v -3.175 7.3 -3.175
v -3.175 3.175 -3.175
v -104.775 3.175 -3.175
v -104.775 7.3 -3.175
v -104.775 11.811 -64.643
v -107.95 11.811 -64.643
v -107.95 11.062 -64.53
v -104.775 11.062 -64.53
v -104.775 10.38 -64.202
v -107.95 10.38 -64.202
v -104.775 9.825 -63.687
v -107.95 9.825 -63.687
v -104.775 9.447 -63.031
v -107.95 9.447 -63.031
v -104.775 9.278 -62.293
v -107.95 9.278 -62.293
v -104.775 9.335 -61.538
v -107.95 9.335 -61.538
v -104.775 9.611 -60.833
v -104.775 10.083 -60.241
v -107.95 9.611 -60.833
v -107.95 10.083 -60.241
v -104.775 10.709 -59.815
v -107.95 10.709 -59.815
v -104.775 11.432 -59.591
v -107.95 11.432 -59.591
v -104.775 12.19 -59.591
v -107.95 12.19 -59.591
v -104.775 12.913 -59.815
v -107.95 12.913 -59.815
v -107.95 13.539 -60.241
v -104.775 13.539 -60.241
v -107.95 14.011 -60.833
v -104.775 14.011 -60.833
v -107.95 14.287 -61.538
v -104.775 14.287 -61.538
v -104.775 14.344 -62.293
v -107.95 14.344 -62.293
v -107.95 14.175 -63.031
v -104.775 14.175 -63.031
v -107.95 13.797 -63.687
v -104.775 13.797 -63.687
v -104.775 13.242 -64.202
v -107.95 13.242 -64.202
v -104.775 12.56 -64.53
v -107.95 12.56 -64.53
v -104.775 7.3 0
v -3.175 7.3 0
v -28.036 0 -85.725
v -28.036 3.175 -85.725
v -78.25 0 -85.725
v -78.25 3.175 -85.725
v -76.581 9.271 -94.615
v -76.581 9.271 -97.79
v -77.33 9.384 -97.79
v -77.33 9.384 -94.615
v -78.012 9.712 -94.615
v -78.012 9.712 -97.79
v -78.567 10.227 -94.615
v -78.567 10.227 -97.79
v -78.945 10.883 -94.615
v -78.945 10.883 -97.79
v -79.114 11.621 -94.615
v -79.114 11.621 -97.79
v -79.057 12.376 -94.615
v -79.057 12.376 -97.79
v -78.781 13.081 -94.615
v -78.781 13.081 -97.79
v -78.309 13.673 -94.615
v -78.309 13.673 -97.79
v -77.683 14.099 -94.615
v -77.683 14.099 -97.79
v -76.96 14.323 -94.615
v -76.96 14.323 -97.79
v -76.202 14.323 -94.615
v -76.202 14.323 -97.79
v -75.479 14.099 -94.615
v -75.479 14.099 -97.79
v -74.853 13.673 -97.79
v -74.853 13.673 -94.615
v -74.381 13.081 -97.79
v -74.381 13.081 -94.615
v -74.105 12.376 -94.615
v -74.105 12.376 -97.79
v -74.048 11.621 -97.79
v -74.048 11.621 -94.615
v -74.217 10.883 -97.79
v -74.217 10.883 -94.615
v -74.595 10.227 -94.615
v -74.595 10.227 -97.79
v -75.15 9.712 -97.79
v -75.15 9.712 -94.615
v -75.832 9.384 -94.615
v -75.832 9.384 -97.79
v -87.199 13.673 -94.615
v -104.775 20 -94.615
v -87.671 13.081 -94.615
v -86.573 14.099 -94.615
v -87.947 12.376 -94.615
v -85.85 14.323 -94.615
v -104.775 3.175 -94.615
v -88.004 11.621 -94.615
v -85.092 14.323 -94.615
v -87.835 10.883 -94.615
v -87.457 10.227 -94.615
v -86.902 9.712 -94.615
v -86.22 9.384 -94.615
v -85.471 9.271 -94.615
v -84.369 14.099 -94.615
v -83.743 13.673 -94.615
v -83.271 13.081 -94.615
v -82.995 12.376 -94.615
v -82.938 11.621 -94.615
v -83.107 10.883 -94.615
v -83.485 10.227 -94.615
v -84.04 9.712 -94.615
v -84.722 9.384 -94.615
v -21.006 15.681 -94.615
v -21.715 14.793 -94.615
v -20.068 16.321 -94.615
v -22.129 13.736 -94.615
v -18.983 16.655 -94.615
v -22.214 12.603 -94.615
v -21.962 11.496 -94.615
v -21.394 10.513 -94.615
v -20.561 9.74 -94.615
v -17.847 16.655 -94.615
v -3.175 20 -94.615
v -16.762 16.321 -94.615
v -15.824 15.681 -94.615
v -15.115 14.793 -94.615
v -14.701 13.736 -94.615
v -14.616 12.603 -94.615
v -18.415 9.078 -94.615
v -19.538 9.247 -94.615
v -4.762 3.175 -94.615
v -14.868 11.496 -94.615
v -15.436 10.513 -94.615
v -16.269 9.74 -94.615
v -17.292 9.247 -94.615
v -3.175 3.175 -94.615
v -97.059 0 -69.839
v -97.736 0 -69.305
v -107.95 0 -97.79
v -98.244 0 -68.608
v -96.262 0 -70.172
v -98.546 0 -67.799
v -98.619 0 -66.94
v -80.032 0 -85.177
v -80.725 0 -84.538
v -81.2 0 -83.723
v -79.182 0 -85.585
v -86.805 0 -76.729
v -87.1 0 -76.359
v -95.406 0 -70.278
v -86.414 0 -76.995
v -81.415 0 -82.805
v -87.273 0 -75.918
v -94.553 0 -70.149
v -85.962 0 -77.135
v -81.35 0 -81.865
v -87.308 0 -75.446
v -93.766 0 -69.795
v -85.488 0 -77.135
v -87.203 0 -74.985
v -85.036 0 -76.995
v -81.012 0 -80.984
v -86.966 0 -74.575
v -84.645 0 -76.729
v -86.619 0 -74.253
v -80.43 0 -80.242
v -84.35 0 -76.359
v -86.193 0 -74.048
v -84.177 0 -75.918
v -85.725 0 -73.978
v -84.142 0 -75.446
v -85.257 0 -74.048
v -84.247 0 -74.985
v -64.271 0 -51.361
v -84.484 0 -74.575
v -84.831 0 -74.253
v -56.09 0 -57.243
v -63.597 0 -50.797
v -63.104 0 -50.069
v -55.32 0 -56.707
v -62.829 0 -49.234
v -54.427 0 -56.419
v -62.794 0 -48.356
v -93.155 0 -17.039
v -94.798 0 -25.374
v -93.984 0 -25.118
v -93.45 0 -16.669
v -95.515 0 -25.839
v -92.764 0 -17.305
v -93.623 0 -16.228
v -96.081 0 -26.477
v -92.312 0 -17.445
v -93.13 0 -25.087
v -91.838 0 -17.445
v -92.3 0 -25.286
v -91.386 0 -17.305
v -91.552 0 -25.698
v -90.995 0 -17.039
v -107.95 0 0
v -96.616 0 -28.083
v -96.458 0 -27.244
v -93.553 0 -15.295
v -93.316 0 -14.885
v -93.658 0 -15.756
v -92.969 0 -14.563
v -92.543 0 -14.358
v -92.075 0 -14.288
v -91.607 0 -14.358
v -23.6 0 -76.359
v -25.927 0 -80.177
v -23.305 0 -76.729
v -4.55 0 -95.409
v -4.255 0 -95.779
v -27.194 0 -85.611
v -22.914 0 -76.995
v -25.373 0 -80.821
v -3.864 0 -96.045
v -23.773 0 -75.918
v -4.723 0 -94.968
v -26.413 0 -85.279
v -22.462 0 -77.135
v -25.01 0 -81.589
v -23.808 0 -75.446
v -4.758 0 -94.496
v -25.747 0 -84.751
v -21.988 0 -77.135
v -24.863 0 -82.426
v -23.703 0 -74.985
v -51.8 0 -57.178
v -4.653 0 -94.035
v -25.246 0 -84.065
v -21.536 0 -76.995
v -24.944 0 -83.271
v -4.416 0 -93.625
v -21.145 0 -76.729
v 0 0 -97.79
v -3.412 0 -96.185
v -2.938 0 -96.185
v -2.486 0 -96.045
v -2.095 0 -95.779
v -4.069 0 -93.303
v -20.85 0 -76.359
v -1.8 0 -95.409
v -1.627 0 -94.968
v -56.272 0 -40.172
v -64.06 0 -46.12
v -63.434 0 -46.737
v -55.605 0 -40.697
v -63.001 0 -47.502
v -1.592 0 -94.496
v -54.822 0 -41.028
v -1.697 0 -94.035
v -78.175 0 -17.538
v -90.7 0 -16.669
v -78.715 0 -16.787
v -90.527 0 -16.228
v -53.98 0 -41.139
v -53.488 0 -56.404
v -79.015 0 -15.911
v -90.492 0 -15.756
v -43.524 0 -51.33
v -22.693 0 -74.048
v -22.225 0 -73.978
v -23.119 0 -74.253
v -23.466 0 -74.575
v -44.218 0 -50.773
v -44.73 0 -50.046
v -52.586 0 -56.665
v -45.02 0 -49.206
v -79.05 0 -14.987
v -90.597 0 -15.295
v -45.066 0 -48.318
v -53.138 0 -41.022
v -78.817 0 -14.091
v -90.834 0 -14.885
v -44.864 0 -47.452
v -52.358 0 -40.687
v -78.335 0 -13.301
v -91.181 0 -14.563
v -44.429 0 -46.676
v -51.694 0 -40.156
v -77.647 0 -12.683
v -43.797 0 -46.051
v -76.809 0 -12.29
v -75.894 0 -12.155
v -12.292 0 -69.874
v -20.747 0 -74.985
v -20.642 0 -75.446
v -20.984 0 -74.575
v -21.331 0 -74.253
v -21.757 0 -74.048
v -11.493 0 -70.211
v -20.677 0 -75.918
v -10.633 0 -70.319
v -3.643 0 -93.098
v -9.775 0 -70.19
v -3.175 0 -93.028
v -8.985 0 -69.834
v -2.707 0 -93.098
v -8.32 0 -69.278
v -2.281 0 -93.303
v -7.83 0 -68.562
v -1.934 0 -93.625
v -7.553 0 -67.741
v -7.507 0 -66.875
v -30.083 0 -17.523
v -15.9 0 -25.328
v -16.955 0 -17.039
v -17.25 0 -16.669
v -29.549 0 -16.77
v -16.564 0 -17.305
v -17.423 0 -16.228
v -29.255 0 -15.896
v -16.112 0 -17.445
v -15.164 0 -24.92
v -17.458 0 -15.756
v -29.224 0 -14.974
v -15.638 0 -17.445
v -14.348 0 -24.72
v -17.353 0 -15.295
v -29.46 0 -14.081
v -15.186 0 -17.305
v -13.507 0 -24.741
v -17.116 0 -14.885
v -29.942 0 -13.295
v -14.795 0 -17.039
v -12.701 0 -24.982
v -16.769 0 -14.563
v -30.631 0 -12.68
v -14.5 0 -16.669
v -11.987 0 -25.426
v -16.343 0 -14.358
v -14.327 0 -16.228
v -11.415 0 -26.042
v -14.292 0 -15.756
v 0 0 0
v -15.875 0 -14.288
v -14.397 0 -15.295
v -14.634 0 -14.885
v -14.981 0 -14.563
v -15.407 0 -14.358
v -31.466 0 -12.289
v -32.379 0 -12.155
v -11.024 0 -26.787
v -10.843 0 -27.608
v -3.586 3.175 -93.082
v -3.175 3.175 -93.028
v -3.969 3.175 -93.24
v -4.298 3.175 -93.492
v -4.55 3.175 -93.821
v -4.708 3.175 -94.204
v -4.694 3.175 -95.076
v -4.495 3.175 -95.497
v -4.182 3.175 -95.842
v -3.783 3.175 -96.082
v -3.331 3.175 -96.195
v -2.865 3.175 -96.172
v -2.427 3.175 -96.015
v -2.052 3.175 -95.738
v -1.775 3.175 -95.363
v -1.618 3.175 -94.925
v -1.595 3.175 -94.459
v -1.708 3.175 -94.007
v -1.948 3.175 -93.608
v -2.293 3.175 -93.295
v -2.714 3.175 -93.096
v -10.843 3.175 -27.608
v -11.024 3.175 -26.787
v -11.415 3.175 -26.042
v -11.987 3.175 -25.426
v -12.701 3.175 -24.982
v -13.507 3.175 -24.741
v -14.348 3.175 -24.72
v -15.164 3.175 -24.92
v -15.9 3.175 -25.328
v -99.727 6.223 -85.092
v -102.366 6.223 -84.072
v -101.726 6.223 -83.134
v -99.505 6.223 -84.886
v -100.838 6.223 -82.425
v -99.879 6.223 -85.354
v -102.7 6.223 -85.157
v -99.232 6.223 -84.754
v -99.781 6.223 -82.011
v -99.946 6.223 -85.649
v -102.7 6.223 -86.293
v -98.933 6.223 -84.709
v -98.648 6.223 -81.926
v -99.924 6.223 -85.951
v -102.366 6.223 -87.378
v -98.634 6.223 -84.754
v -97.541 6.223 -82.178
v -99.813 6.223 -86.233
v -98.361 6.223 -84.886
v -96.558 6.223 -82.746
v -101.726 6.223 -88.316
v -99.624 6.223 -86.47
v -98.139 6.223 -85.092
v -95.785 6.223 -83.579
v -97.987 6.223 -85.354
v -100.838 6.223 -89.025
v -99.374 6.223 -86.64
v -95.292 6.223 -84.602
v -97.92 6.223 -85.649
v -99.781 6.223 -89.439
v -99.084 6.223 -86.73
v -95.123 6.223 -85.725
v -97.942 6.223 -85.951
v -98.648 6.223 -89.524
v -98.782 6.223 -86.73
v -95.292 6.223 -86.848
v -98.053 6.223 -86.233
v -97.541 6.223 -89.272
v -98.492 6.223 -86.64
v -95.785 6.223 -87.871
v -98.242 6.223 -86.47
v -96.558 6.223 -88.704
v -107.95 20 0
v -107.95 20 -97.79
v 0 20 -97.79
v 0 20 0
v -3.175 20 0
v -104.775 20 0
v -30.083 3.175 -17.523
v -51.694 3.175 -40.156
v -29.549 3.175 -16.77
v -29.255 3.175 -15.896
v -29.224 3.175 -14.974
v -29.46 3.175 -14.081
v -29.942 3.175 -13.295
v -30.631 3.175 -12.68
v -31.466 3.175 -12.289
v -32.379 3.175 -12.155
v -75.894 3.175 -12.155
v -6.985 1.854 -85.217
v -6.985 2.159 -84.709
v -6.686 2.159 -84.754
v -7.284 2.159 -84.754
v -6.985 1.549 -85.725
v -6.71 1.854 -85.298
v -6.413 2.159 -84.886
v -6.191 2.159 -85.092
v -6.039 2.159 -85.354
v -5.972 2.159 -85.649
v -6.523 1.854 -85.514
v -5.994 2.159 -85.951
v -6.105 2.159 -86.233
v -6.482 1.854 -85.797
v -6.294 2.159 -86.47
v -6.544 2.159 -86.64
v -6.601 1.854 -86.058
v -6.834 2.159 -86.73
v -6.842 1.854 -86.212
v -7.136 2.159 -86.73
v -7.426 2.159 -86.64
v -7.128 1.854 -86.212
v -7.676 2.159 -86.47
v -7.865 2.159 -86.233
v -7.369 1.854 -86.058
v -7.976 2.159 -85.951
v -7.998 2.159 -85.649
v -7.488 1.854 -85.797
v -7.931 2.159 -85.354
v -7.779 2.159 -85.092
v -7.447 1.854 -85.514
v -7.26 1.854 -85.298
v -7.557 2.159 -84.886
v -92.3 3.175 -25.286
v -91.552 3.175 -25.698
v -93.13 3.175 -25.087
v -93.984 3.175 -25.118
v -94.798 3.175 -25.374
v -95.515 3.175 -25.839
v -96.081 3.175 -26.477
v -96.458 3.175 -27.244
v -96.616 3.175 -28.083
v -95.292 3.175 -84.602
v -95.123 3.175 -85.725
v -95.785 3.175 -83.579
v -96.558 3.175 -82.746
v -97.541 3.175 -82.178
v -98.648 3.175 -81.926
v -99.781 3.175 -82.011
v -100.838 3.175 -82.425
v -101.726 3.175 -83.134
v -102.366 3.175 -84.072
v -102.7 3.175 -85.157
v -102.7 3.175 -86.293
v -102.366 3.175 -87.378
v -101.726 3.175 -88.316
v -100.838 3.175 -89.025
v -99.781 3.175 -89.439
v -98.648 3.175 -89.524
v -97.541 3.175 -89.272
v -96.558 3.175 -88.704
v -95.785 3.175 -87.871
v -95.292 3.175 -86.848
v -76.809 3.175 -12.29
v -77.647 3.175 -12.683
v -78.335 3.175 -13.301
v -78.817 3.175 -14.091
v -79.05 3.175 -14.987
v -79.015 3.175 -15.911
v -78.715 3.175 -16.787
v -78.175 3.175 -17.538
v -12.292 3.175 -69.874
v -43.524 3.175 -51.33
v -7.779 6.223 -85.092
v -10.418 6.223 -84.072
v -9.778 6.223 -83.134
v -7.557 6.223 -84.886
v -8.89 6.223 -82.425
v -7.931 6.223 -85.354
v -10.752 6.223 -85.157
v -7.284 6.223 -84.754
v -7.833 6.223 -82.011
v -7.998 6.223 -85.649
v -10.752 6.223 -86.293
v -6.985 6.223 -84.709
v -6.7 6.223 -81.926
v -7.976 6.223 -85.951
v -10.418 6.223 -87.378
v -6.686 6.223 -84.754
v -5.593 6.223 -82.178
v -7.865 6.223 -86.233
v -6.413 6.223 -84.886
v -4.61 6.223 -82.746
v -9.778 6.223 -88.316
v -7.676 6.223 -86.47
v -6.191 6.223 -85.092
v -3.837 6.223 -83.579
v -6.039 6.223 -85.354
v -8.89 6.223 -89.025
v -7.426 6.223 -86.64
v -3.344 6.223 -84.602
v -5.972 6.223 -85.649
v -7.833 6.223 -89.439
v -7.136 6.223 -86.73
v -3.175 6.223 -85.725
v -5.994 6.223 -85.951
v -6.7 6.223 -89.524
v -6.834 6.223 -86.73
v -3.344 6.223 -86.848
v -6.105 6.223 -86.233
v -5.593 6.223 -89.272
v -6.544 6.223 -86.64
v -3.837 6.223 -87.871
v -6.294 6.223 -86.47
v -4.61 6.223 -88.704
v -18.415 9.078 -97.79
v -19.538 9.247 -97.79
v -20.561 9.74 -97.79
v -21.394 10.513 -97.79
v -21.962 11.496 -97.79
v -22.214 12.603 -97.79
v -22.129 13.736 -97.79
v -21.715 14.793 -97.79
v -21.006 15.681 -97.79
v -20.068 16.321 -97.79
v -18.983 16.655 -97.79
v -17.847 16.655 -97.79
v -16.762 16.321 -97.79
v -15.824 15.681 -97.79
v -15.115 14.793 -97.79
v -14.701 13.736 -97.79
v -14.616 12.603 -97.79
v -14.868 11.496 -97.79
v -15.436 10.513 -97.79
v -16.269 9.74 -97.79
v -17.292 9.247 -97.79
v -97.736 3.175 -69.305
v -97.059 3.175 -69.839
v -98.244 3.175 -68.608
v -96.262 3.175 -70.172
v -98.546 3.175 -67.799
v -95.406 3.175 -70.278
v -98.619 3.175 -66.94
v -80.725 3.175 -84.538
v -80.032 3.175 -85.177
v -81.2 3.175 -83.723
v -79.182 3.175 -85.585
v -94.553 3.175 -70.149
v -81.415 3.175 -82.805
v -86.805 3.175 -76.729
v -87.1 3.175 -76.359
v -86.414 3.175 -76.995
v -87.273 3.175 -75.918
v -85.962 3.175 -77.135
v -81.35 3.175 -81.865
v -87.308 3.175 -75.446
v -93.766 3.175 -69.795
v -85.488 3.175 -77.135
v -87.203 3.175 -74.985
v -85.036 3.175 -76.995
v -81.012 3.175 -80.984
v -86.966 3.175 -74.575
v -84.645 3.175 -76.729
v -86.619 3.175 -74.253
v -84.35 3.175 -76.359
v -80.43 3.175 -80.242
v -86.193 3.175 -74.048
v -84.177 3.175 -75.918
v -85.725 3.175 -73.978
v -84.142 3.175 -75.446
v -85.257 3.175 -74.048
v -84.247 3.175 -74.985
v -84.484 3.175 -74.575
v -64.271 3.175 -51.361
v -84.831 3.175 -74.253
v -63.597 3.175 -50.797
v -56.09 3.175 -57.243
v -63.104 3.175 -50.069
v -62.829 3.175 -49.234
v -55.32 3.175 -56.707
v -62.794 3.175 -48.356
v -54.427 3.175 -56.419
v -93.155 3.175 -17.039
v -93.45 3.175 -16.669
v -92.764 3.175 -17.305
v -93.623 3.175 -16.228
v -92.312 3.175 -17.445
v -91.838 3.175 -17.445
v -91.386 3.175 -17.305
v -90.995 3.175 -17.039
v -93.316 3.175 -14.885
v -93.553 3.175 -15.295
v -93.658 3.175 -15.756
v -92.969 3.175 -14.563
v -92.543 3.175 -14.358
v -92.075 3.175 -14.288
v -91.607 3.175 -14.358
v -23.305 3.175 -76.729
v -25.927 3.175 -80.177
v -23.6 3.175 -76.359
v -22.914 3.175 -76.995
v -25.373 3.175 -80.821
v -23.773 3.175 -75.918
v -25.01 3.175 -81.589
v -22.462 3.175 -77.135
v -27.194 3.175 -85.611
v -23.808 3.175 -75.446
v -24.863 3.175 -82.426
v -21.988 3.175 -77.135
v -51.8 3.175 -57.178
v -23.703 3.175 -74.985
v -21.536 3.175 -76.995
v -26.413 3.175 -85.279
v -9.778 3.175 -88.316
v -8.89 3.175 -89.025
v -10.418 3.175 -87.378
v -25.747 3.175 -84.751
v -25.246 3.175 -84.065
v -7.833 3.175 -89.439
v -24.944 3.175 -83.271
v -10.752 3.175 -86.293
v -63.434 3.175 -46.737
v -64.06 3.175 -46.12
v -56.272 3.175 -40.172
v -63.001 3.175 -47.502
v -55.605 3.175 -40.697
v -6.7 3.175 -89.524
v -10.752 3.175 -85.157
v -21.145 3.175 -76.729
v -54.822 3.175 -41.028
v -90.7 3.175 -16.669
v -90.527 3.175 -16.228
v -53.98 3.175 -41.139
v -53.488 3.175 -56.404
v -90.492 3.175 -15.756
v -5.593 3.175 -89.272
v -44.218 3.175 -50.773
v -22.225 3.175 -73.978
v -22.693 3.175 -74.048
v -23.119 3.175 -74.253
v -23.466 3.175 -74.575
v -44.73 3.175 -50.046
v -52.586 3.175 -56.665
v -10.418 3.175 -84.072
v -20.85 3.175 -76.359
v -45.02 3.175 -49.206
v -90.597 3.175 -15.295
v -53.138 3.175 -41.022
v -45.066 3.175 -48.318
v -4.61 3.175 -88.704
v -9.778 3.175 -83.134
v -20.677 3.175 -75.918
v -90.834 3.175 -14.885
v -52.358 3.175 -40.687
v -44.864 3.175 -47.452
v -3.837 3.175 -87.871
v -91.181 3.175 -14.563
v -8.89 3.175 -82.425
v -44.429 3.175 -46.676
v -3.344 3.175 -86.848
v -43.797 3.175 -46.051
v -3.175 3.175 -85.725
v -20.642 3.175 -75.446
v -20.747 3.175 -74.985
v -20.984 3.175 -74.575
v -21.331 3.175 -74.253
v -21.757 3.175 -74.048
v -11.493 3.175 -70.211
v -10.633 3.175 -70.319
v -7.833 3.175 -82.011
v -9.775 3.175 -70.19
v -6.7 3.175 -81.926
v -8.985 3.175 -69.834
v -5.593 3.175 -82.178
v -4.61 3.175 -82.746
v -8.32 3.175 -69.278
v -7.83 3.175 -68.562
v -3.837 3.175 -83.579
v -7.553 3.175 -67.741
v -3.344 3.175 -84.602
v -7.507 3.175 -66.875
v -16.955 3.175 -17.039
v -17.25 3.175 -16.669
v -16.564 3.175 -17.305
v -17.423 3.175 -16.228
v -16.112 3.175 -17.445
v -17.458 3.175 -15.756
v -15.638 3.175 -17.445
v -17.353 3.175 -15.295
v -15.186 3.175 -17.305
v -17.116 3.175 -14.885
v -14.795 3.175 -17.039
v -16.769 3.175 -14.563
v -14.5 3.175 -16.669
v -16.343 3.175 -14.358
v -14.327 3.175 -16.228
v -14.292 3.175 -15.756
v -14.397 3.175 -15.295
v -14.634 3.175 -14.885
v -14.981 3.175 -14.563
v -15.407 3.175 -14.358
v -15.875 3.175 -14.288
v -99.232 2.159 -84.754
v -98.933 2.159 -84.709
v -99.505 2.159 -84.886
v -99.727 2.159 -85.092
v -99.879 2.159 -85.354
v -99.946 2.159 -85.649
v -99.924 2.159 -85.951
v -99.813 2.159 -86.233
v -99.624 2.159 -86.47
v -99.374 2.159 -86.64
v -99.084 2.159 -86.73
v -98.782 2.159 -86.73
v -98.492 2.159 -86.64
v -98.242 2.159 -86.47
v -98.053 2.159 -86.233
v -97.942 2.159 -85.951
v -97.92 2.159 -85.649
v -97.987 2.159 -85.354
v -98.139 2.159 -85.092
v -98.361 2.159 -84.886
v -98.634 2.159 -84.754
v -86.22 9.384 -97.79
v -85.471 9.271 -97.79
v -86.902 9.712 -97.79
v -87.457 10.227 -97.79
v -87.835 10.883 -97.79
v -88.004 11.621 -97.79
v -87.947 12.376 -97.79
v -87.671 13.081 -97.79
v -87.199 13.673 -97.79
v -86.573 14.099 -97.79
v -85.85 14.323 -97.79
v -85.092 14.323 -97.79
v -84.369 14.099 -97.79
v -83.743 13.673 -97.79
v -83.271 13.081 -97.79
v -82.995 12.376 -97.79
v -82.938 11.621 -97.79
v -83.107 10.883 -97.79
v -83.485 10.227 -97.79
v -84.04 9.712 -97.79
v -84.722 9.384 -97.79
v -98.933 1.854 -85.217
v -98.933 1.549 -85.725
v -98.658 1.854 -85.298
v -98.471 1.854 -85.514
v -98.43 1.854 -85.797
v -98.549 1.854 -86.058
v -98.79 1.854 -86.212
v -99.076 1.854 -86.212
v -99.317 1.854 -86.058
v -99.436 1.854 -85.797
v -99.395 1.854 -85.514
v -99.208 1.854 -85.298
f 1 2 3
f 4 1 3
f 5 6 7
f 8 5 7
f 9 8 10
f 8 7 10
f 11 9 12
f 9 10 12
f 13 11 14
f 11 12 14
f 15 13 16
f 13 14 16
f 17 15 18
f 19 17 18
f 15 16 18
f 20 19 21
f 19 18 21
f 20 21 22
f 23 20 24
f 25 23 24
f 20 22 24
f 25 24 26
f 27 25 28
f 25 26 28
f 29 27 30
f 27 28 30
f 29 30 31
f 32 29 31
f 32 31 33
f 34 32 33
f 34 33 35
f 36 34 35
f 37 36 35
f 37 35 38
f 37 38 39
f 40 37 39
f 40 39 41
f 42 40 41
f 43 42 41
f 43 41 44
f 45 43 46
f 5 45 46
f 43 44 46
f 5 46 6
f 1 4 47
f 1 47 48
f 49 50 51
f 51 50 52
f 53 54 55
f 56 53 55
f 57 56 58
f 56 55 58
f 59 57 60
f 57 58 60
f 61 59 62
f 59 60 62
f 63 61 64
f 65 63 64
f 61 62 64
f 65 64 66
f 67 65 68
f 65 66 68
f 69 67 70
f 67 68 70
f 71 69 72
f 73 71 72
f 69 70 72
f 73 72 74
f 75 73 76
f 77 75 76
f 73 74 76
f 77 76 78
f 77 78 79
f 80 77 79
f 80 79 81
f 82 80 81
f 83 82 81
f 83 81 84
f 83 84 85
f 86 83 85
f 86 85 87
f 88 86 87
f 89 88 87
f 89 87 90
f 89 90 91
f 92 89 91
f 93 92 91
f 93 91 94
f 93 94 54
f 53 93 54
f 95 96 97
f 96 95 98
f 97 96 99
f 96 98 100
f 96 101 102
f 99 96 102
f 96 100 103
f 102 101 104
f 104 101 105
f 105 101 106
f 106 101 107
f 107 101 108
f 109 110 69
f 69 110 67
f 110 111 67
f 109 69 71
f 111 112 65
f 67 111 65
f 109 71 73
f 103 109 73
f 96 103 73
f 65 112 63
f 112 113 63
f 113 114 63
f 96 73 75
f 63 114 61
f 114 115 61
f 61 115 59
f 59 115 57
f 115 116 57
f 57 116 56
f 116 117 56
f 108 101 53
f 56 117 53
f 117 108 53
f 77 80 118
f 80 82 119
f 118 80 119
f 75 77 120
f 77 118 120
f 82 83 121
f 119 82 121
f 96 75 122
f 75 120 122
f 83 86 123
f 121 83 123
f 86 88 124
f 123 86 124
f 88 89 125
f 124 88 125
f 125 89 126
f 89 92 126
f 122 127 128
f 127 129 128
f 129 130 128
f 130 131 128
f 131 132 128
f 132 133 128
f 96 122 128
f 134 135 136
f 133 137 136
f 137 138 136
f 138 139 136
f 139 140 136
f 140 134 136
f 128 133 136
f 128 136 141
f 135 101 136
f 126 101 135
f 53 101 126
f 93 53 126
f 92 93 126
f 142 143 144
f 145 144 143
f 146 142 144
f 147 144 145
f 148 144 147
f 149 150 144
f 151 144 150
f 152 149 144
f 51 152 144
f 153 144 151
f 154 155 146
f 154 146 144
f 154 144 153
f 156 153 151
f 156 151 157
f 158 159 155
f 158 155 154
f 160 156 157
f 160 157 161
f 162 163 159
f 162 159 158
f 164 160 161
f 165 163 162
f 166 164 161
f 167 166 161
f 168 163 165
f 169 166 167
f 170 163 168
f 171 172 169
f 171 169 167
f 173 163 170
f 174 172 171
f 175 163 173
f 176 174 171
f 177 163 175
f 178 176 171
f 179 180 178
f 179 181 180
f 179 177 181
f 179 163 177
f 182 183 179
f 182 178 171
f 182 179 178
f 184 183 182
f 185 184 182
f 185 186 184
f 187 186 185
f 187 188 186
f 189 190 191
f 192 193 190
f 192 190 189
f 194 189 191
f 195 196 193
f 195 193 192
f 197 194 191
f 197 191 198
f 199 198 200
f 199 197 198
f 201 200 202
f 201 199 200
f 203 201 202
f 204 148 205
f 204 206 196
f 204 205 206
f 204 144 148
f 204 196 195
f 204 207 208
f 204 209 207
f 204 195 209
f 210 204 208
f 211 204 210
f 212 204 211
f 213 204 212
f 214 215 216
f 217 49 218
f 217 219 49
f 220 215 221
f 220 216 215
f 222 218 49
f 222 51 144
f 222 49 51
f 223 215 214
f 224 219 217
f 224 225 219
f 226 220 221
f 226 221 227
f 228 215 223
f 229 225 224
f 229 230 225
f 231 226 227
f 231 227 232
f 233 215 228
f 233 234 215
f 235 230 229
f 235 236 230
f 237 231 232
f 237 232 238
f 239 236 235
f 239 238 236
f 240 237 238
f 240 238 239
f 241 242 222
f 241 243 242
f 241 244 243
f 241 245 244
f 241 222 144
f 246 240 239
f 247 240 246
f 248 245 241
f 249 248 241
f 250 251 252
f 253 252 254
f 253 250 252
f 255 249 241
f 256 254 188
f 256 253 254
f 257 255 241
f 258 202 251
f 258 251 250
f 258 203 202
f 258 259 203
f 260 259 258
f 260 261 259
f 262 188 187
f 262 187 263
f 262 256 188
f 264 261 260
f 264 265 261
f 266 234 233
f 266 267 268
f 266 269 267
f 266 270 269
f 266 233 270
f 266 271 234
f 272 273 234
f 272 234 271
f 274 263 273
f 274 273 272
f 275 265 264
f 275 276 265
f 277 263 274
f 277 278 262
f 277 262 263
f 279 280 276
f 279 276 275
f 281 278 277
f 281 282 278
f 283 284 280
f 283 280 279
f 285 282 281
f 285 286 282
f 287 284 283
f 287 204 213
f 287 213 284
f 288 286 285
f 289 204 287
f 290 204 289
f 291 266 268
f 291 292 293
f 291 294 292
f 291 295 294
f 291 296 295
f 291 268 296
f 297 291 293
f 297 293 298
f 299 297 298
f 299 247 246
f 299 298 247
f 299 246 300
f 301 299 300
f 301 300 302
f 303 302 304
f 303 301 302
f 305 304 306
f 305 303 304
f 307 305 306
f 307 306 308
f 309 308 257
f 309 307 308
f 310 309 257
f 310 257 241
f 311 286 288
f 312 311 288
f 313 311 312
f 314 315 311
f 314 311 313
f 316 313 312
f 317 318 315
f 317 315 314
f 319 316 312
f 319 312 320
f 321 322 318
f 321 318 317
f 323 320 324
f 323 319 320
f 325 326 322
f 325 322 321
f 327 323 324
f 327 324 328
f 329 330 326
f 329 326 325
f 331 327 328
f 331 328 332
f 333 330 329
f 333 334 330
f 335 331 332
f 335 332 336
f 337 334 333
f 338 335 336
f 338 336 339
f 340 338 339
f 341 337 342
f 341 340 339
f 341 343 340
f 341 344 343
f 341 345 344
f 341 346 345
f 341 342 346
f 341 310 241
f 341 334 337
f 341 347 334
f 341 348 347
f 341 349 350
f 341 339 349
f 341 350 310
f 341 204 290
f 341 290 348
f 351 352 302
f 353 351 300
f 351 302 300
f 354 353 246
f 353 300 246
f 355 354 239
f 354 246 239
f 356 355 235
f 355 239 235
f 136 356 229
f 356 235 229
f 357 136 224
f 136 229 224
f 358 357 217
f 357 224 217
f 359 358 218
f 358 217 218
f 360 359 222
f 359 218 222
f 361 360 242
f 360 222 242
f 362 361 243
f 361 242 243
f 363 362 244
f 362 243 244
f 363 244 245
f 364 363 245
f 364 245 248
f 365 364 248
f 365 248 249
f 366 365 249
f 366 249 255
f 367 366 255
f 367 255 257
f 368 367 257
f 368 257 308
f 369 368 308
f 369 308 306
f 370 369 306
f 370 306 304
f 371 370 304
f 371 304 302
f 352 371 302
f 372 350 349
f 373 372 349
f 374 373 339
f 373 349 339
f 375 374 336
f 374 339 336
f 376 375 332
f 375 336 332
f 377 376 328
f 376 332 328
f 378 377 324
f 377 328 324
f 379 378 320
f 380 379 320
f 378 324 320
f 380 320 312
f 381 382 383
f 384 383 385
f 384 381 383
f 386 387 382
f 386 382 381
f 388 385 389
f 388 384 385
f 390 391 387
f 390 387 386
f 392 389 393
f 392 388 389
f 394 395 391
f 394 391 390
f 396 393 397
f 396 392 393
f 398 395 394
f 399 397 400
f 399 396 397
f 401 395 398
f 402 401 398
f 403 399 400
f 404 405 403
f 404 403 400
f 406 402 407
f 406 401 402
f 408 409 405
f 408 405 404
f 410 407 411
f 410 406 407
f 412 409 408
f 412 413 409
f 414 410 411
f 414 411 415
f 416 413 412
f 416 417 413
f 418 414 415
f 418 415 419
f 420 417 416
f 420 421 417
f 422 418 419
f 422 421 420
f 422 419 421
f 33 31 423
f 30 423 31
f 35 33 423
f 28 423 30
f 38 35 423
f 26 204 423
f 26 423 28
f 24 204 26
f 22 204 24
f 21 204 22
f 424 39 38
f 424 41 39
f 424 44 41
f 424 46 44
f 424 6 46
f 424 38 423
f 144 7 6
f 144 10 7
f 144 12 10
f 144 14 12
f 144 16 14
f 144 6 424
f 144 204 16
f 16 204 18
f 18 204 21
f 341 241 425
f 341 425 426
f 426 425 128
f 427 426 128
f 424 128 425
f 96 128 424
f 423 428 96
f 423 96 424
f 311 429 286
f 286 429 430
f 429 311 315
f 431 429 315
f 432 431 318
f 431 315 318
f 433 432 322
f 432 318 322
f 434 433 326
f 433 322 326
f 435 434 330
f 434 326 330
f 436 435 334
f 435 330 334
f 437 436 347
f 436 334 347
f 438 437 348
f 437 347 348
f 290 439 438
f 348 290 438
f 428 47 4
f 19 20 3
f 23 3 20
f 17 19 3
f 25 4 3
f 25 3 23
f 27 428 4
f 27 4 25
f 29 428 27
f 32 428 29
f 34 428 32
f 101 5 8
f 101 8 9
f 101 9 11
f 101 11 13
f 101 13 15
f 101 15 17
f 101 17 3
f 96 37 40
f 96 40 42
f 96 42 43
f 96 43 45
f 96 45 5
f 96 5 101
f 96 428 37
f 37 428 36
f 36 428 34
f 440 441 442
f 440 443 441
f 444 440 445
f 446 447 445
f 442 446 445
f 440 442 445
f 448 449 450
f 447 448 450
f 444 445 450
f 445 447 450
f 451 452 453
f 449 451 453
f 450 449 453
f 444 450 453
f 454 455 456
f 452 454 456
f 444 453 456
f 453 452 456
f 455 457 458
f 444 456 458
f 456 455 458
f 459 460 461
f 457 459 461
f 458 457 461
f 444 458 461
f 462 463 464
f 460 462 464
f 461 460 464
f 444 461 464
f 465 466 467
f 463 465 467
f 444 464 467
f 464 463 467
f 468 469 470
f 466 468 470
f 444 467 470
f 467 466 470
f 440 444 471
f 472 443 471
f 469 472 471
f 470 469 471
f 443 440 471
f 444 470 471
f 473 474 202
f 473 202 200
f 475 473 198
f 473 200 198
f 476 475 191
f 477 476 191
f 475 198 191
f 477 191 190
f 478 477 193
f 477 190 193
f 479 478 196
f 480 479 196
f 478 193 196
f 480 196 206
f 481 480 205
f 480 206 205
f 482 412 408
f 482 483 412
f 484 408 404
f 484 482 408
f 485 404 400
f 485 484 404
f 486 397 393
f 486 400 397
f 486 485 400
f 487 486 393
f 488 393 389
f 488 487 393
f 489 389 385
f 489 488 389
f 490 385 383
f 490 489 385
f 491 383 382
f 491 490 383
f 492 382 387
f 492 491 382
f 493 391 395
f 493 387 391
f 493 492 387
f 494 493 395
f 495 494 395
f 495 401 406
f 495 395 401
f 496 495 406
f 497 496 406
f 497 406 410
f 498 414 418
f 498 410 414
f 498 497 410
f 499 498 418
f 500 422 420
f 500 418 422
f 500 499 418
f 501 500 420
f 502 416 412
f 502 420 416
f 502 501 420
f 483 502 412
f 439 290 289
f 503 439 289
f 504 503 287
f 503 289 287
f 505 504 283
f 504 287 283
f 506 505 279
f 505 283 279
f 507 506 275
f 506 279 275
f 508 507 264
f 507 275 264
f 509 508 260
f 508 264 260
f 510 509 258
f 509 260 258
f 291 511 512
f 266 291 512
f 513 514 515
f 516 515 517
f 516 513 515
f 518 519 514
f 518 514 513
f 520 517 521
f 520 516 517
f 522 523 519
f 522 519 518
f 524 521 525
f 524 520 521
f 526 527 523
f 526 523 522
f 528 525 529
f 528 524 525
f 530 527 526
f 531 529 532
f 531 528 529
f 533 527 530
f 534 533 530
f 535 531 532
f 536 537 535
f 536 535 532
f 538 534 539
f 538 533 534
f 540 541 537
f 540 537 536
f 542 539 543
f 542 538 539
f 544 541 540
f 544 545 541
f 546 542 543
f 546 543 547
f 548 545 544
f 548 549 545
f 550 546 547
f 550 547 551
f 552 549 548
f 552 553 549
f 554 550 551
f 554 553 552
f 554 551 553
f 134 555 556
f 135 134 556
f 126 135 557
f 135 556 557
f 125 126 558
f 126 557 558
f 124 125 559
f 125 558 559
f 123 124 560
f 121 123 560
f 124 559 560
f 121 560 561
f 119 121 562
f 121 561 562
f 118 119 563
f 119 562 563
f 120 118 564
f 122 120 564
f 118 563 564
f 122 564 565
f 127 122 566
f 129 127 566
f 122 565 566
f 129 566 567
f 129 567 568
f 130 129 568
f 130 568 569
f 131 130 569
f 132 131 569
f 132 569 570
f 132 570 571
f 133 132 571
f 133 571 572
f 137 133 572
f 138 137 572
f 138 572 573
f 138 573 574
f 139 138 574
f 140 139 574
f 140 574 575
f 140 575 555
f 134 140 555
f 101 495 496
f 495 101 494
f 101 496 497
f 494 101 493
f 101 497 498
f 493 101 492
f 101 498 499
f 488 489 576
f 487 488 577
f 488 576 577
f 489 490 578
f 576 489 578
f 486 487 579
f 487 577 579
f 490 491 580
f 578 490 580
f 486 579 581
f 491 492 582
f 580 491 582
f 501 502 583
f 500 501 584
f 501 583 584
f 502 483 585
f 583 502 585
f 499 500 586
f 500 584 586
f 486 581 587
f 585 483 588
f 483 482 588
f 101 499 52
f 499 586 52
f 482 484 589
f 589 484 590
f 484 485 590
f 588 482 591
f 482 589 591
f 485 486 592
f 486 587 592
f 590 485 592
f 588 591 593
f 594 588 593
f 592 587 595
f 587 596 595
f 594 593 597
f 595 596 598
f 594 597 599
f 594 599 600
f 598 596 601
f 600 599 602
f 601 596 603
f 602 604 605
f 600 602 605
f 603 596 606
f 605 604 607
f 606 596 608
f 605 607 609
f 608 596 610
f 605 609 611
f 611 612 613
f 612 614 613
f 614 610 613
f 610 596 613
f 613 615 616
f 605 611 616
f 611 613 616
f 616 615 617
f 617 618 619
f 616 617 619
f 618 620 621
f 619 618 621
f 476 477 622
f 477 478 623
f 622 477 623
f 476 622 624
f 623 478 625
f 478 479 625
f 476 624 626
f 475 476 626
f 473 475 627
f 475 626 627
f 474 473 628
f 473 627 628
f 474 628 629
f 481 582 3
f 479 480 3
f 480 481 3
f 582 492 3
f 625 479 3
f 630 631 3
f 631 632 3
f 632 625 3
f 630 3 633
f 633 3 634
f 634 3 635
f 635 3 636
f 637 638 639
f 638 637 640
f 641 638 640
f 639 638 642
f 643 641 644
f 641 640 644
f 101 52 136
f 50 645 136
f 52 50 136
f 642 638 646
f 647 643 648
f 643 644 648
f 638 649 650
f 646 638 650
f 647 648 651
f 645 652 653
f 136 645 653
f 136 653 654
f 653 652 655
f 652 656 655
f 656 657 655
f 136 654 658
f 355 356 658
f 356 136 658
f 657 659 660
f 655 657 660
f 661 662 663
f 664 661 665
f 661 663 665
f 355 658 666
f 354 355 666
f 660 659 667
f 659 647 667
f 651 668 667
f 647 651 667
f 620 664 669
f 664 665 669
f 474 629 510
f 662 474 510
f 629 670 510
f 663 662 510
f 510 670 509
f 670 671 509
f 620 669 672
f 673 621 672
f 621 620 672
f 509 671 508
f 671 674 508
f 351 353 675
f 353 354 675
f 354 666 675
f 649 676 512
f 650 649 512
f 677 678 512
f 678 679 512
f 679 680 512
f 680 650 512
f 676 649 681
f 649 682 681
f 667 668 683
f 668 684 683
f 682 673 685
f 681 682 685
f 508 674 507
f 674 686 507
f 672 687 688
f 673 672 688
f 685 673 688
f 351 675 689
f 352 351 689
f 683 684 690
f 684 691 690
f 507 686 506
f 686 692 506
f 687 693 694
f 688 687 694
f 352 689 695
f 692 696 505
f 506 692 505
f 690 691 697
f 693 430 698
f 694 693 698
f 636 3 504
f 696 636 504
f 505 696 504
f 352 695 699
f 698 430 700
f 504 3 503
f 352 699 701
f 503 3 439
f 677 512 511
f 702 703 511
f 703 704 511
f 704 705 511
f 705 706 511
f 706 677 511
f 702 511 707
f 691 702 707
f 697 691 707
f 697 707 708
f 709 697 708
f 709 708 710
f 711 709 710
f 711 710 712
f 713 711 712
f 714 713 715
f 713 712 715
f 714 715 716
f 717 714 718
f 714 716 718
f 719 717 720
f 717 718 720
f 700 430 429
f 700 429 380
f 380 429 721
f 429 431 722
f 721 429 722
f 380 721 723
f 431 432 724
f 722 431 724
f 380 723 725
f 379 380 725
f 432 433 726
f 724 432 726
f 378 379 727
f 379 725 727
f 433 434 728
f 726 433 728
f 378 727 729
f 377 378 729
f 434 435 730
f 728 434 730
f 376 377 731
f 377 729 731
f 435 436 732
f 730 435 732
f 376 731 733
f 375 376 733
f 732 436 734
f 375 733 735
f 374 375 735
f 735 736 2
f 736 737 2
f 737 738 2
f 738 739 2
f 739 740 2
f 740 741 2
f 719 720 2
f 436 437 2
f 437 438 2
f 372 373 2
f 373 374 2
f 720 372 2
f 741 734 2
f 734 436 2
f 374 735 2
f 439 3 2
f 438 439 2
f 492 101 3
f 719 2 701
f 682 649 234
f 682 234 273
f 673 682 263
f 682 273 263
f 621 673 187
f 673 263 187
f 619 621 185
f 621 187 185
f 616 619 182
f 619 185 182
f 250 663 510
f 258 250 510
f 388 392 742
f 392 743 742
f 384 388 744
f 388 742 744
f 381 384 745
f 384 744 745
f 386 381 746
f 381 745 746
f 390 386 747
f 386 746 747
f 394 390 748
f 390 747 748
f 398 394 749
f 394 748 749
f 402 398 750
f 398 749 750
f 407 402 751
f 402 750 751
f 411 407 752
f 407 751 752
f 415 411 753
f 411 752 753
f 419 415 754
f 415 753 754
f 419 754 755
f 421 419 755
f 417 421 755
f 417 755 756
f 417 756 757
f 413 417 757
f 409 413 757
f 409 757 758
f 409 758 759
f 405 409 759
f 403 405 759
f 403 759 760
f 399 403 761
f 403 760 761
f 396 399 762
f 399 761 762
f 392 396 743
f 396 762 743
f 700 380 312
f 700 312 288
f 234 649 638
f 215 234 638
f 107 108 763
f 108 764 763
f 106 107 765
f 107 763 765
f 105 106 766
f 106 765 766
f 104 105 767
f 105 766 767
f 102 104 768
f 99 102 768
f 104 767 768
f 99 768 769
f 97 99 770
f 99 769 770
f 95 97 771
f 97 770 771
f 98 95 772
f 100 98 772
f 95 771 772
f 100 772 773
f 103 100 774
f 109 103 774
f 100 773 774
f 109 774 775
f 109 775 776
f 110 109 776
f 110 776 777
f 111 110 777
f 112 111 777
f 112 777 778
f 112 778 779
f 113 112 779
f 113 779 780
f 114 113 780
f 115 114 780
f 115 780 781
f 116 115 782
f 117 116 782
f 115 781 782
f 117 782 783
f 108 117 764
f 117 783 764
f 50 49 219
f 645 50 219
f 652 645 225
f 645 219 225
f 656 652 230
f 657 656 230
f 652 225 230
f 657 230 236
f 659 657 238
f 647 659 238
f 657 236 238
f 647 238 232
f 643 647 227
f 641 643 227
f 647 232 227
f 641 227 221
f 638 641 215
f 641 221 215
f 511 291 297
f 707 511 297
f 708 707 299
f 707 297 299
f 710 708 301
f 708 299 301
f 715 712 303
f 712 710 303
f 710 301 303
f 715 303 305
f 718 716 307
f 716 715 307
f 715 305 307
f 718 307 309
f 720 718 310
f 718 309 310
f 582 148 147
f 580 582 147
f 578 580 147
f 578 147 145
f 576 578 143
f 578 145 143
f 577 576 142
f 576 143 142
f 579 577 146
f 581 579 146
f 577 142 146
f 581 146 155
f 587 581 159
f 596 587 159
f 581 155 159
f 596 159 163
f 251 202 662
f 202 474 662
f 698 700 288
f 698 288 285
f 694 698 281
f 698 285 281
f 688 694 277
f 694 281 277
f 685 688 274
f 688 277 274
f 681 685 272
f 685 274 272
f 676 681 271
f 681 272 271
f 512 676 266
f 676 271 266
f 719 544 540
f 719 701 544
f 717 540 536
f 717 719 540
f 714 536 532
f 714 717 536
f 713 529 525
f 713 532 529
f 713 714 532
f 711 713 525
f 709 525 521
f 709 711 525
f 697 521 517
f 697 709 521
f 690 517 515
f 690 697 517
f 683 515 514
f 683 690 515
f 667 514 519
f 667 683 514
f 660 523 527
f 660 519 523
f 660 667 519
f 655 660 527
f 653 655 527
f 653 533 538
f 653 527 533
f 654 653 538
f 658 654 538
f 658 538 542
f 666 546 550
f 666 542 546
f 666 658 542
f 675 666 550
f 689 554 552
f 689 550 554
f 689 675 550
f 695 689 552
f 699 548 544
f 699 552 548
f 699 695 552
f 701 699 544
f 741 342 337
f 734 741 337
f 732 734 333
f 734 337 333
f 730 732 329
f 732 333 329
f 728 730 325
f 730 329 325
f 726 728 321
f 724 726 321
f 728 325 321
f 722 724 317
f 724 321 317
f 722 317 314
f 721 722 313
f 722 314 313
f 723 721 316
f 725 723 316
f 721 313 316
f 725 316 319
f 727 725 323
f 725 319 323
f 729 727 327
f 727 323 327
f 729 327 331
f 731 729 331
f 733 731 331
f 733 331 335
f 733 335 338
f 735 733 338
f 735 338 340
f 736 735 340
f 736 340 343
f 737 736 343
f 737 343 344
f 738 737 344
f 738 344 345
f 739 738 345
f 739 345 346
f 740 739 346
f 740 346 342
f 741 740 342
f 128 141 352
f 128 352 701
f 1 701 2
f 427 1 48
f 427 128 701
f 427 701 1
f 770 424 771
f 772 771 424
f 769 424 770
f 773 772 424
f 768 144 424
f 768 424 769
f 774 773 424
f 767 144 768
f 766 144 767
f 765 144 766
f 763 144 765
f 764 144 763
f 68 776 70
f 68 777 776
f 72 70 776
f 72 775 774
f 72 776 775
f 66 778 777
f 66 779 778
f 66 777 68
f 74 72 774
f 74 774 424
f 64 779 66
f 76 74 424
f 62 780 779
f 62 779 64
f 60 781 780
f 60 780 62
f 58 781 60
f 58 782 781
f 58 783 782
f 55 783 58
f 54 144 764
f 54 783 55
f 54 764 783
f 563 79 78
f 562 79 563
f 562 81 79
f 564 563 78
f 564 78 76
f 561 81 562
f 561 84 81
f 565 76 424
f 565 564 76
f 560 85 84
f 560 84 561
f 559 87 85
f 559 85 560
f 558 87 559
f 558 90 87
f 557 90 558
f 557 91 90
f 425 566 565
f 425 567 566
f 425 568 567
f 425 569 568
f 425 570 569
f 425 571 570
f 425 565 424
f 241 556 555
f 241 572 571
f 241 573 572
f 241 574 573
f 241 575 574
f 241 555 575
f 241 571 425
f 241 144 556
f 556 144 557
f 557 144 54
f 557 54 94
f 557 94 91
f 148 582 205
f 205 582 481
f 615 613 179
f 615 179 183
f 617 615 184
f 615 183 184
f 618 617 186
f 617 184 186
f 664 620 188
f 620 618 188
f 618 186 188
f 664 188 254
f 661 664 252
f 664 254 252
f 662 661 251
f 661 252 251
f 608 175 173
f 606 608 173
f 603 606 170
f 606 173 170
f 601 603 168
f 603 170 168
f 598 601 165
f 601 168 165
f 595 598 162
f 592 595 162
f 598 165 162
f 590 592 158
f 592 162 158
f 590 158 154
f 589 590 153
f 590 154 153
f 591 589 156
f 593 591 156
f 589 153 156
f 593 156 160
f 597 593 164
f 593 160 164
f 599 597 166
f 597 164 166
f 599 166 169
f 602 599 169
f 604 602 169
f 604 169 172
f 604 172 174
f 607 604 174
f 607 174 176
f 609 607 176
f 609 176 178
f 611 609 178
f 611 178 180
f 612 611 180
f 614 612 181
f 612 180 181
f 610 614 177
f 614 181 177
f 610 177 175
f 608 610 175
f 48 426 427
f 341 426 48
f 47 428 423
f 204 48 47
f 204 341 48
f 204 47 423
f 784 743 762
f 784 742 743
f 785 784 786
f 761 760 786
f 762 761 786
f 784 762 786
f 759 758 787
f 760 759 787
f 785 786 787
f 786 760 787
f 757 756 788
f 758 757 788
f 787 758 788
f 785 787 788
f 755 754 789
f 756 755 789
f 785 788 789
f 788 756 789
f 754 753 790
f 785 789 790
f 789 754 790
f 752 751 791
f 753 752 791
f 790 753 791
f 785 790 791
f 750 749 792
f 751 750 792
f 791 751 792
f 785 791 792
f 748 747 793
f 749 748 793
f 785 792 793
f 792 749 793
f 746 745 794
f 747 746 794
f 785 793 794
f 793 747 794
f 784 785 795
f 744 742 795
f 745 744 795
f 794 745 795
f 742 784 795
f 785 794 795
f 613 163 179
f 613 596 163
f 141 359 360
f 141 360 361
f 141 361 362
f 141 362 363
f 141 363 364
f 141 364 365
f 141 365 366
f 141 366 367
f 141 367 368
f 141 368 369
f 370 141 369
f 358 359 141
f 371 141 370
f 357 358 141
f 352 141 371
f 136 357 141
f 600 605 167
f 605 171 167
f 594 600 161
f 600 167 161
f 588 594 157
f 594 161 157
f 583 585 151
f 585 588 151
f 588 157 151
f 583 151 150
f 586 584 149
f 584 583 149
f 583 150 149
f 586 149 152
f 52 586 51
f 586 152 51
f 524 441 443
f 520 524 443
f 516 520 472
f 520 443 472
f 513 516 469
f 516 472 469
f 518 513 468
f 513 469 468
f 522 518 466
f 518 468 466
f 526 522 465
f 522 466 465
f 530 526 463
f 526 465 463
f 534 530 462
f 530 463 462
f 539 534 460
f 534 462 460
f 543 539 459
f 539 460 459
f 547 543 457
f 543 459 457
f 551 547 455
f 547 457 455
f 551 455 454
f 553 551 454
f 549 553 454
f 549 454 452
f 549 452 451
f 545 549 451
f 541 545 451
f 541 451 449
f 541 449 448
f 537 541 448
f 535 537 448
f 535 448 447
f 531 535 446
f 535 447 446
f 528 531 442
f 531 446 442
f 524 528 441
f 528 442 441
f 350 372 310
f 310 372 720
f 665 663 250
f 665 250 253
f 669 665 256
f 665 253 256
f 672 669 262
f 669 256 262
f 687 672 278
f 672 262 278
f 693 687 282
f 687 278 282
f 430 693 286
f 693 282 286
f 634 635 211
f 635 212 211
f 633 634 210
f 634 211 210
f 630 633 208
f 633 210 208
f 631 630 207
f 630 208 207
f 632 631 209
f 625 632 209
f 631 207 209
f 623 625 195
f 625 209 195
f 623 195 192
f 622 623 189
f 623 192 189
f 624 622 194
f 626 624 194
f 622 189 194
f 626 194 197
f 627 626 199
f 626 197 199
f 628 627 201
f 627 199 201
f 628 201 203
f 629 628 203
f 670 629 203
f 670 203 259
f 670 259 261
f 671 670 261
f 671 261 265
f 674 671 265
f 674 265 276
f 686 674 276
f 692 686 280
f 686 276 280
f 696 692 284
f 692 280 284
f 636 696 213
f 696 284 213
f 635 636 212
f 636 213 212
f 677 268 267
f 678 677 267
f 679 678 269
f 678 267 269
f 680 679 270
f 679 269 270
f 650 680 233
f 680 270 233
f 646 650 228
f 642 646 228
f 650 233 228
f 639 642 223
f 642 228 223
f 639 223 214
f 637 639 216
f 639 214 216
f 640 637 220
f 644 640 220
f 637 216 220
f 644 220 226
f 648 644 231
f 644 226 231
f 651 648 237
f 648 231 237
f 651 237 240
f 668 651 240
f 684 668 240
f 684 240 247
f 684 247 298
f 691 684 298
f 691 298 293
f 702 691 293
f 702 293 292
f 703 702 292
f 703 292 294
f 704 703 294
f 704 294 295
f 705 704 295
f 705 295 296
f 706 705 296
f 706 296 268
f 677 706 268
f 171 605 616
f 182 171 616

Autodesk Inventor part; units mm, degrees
ref_plane "YZ Plane" through (0, 0, 0) normal (1, 0, 0) x (0, 1, 0)
ref_plane "XZ Plane" through (0, 0, 0) normal (0, 1, 0) x (-1, 0, 0)
ref_plane "XY Plane" through (0, 0, 0) normal (0, 0, 1) x (1, 0, 0)
sketch "Sketch1" plane through (0, 0, 0) normal (0, 1, 0) x (-1, 0, 0)
  line L0 (0, 0) -> (3.175, 0)
  line L1 (3.175, 0) -> (3.175, -3.175)
  line L2 (3.175, -3.175) -> (0, -3.175)
  line L3 (0, -3.175) -> (0, 0)
  line L4 (3.175, -3.175) -> (104.775, -3.175)
  line L5 (104.775, -3.175) -> (104.775, -94.615)
  line L6 (104.775, -94.615) -> (3.175, -94.615)
  line L7 (3.175, -94.615) -> (3.175, -3.175)
  line L8 (104.775, -94.615) -> (107.95, -94.615)
  line L9 (107.95, -94.615) -> (107.95, -97.79)
  line L10 (107.95, -97.79) -> (104.775, -97.79)
  line L11 (104.775, -97.79) -> (104.775, -94.615)
  line L12 (107.95, -97.79) -> (0, -97.79)
  line L13 (0, -97.79) -> (0, 0)
  line L14 (0, 0) -> (107.95, 0)
  line L15 (107.95, 0) -> (107.95, -97.79)
  dimension "d0" = 3.175
  dimension "d1" = 3.175
  dimension "d2" = 101.6
  dimension "d3" = 91.44
  dimension "d4" = 3.175
  dimension "d5" = 3.175
extrude "Extrusion1" add sketch "Sketch1" along normal blind 20 contours L0 L1 L2 L3 | L14 L15 L8 L5 L4 L1 | L2 L7 L6 L11 L12 L13 | L9 L10 L11 L8
sketch "Sketch6" plane through (0, 0, 0) normal (0, -1, 0) x (1, 0, 0)
  line L0 (-104.775, -3.175) -> (-3.175, -3.175) projected
  line L1 (-3.175, -3.175) -> (-3.175, -94.615) projected
  line L2 (-3.175, -94.615) -> (-104.775, -94.615) projected
  line L3 (-104.775, -94.615) -> (-104.775, -3.175) projected
  line L4 (0, 0) -> (0, -97.79) projected
  line L5 (-107.95, 0) -> (0, 0) projected
  line L6 (-107.95, -97.79) -> (-107.95, 0) projected
  line L7 (0, -97.79) -> (-107.95, -97.79) projected
extrude "Extrusion5" add sketch "Sketch6" against normal blind 3.175 contours L0 L1 L2 L3
sketch "Sketch7" plane through (0, 20, 0) normal (0, 1, 0) x (1, 0, 0)
  line L0 (-104.775, 3.175) -> (-3.175, 3.175)
  line L1 (-3.175, 3.175) -> (-3.175, 0)
  line L2 (-3.175, 0) -> (-104.775, 0)
  line L3 (-104.775, 0) -> (-104.775, 3.175)
  point P0 (0, 0)
extrude "Extrusion6" cut sketch "Sketch7" against normal blind 12.7
sketch "Sketch9" plane through (0, 3.175, 0) normal (0, 1, 0) x (1, 0, 0)
  line L0 (-104.775, 94.615) -> (-3.175, 94.615) construction
  line L1 (-104.775, 94.615) -> (-101.473, 94.615) construction
  line L2 (-101.473, 94.615) -> (-101.473, 89.535) construction
  line L3 (-101.473, 89.535) -> (-104.775, 89.535) construction
  line L4 (-104.775, 89.535) -> (-104.775, 94.615) construction
  line L5 (-3.175, 94.615) -> (-3.175, 3.175) construction
  line L6 (-101.473, 89.535) -> (-3.175, 89.535) construction
  line L7 (-3.175, 89.535) -> (-3.175, 3.175) construction
  line L8 (-3.175, 3.175) -> (-101.473, 3.175) construction
  line L9 (-101.473, 3.175) -> (-101.473, 89.535) construction
  line L10 (-101.473, 89.535) -> (-98.933, 89.535) construction
  line L11 (-98.933, 89.535) -> (-98.933, 85.725) construction
  line L12 (-98.933, 85.725) -> (-101.473, 85.725) construction
  line L13 (-101.473, 85.725) -> (-101.473, 89.535) construction
  line L14 (-3.175, 89.535) -> (-6.985, 89.535) construction
  line L15 (-6.985, 89.535) -> (-6.985, 85.725) construction
  line L16 (-6.985, 85.725) -> (-3.175, 85.725) construction
  line L17 (-3.175, 85.725) -> (-3.175, 89.535) construction
  circle A0 centre (-98.933, 85.725) radius 3.81
  circle A1 centre (-6.985, 85.725) radius 3.81
  point P0 (0, 0)
  dimension "d53" = 3.302
  dimension "d54" = 5.08
  dimension "d55" = 2.54
  dimension "d56" = 3.81
  dimension "d57" = 3.81
  dimension "d58" = 3.81
extrude "Extrusion9" add sketch "Sketch9" along normal blind 3.048
sketch "Sketch11" plane through (-104.775, 20, 0) normal (1, 0, 0) x (0, 0, -1)
  line L0 (89.535, -13.777) -> (81.915, -13.777) projected
  line L1 (85.725, -13.777) -> (62.103, -13.777)
  line L2 (62.103, -13.777) -> (62.103, -8.189)
  point P0 (0, -20)
  dimension "d103" = 5.588
hole "Hole3" at (-104.775, 11.811, -62.103) direction (-1, 0, 0) diameter 5.08 depth 4.064 tip angle 118
sketch "Sketch12" plane through (-98.933, 6.223, -85.725) normal (0, 1, 0) x (1, 0, 0)
  circle A0 centre (0, 0) radius 3.81 projected
  circle A1 centre (91.948, 0) radius 3.81 projected
  point P0 (98.933, -85.725)
  point P1 (95.758, 0)
hole "Hole4" at (-98.933, 6.223, -85.725) at (-6.985, 6.223, -85.725) direction (0, -1, 0) diameter 2.032 depth 4.064 tip angle 118
sketch "Sketch13" plane through (-104.775, 20, -94.615) normal (0, 0, 1) x (1, 0, 0)
  line L0 (9.652, -13.777) -> (2.032, -13.777) projected
  line L1 (5.842, -13.777) -> (19.304, -13.777)
  line L2 (19.304, -13.777) -> (19.304, -8.189)
  line L3 (19.304, -8.189) -> (28.194, -8.189)
  point P0 (104.775, -20)
  dimension "d84" = 13.462
  dimension "d85" = 5.588
  dimension "d86" = 8.89
hole "Hole5" at (-85.471, 11.811, -94.615) at (-76.581, 11.811, -94.615) direction (0, 0, -1) diameter 5.08 depth 4.064 tip angle 118
sketch "Sketch14" plane through (-104.775, 20, -94.615) normal (0, 0, 1) x (1, 0, 0)
  line L0 (0, -12.7) -> (101.6, -12.7) projected
  line L1 (101.6, -12.7) -> (101.6, -7.112)
  line L2 (101.6, -16.825) -> (101.6, 0) projected
  line L3 (101.6, -7.112) -> (86.36, -7.112)
  point P0 (104.775, -20)
  dimension "d94" = 5.588
  dimension "d95" = 15.24
hole "Hole6" at (-18.415, 12.888, -94.615) direction (0, 0, -1) diameter 7.62 depth 4.064 tip angle 118
sketch "Sketch15" plane through (0, 3.175, 0) normal (0, 1, 0) x (1, 0, 0)
  circle A0 centre (-98.933, 85.725) radius 1.016 projected
  line L0 (-98.933, 85.725) -> (-86.233, 85.725)
  circle A1 centre (-6.985, 85.725) radius 1.016 projected
  line L1 (-6.985, 85.725) -> (-19.685, 85.725)
  line L2 (-6.985, 85.725) -> (-6.985, 73.025)
  circle A2 centre (-98.933, 85.725) radius 3.81 projected
  line L3 (-98.933, 85.725) -> (-98.933, 73.025)
  line L4 (-104.775, 3.175) -> (-95.7947, 12.1553)
  line L5 (-104.775, 3.175) -> (-92.075, 3.175) construction
  line L6 (-3.175, 85.725) -> (-3.175, 3.175) projected
  line L7 (-3.175, 3.175) -> (-12.1553, 12.1553)
  line L8 (-3.175, 3.175) -> (9.525, 3.175) construction
  line L9 (-98.933, 73.025) -> (-95.7947, 12.1553)
  line L10 (-104.775, 0) -> (-104.775, 94.615) projected
  line L11 (-95.7947, 12.1553) -> (-12.1553, 12.1553)
  line L12 (-12.1553, 12.1553) -> (-6.985, 73.025)
  line L13 (-6.985, 73.025) -> (-19.685, 85.725)
  line L14 (-19.685, 85.725) -> (-86.233, 85.725)
  line L15 (-86.233, 85.725) -> (-98.933, 73.025)
  line L16 (-104.775, 94.615) -> (-3.175, 94.615) construction
  line L17 (-53.975, 94.615) -> (-53.975, 3.175) construction
  line L18 (-104.775, 3.175) -> (-3.175, 3.175) construction
  line L19 (-53.975, 48.895) -> (-60.325, 48.895) construction
  line L20 (-60.325, 48.895) -> (-60.325, 55.245) construction
  line L21 (-60.325, 55.245) -> (-53.975, 55.245) construction
  line L22 (-53.975, 55.245) -> (-53.975, 48.895) construction
  line L23 (-53.975, 48.895) -> (-47.625, 48.895) construction
  line L24 (-47.625, 48.895) -> (-47.625, 42.545) construction
  line L25 (-47.625, 42.545) -> (-53.975, 42.545) construction
  line L26 (-53.975, 42.545) -> (-53.975, 48.895) construction
  line L27 (-86.233, 85.725) -> (-53.975, 55.245)
  line L28 (-53.975, 55.245) -> (-19.685, 85.725)
  line L29 (-6.985, 73.025) -> (-47.625, 48.895)
  line L30 (-98.933, 73.025) -> (-60.325, 48.895)
  line L31 (-3.175, 3.175) -> (-3.175, 15.875) construction
  line L32 (-3.175, 3.175) -> (-15.875, 3.175) construction
  line L33 (-11.3251, 21.9293) -> (-47.625, 48.895)
  line L34 (-24.9577, 12.1553) -> (-53.975, 42.545)
  line L35 (-104.775, 3.175) -> (-92.075, 3.175) construction
  line L36 (-104.775, 3.175) -> (-104.775, 15.875) construction
  line L37 (-96.3107, 22.1628) -> (-60.325, 48.895)
  line L38 (-53.975, 42.545) -> (-83.3844, 12.1553)
  point P0 (0, 0)
  dimension "d104" = 12.7
  dimension "d105" = 12.7
  dimension "d106" = 12.7
  dimension "d107" = 12.7
  dimension "d108" = 12.7
  dimension "d109" = 45
  dimension "d110" = 12.7
  dimension "d111" = 135
  dimension "d112" = 6.35
  dimension "d113" = 6.35
  dimension "d114" = 6.35
  dimension "d115" = 6.35
  dimension "d116" = 12.7
  dimension "d117" = 12.7
  dimension "d118" = 12.7
  dimension "d119" = 12.7
extrude "Extrusion10" cut sketch "Sketch15" against normal blind 25.4 contours L14 L28 L27 | L30 L37 L9 | L12 L33 L29 | L38 L34 L11
fillet "Fillet1" radius 3.175 12 edges at (-96.3107, 1.5875, -22.1628) (-60.325, 1.5875, -48.895) (-53.975, 1.5875, -55.245) (-53.975, 1.5875, -42.545) (-47.625, 1.5875, -48.895) (-83.3844, 1.5875, -12.1553) (-24.9577, 1.5875, -12.1553) (-86.233, 1.5875, -85.725) (-98.933, 1.5875, -73.025) (-19.685, 1.5875, -85.725) (-6.985, 1.5875, -73.025) (-11.3251, 1.5875, -21.9293)
sketch "Sketch16" plane through (0, 3.175, 0) normal (0, 1, 0) x (1, 0, 0)
  line L0 (-104.775, 3.175) -> (-104.775, 94.615) construction
  line L1 (-104.775, 94.615) -> (-85.725, 94.615) construction
  line L2 (-85.725, 94.615) -> (-85.725, 75.565) construction
  line L3 (-85.725, 75.565) -> (-104.775, 75.565) construction
  line L4 (-104.775, 75.565) -> (-104.775, 94.615) construction
  line L5 (-3.175, 94.615) -> (-22.225, 94.615) construction
  line L6 (-22.225, 94.615) -> (-22.225, 75.565) construction
  line L7 (-22.225, 75.565) -> (-3.175, 75.565) construction
  line L8 (-3.175, 75.565) -> (-3.175, 94.615) construction
  line L9 (-3.175, 3.175) -> (-104.775, 3.175) construction
  line L10 (-104.775, 3.175) -> (-92.075, 3.175) construction
  line L11 (-92.075, 3.175) -> (-92.075, 15.875) construction
  line L12 (-92.075, 15.875) -> (-104.775, 15.875) construction
  line L13 (-104.775, 15.875) -> (-104.775, 3.175) construction
  line L14 (-3.175, 3.175) -> (-15.875, 3.175) construction
  line L15 (-15.875, 3.175) -> (-15.875, 15.875) construction
  line L16 (-15.875, 15.875) -> (-3.175, 15.875) construction
  line L17 (-3.175, 15.875) -> (-3.175, 3.175) construction
  point P0 (0, 0)
  dimension "d123" = 19.05
  dimension "d124" = 19.05
  dimension "d125" = 19.05
  dimension "d126" = 19.05
  dimension "d127" = 12.7
  dimension "d128" = 12.7
  dimension "d129" = 12.7
  dimension "d130" = 12.7
hole "Hole7" at (-3.175, 3.175, -94.615) at (-85.725, 3.175, -75.565) at (-22.225, 3.175, -75.565) at (-15.875, 3.175, -15.875) at (-92.075, 3.175, -15.875) direction (0, -1, 0) diameter 3.175 depth 25.4 tip angle 118
properties part number "radiocase" material "ABS Plastic"
